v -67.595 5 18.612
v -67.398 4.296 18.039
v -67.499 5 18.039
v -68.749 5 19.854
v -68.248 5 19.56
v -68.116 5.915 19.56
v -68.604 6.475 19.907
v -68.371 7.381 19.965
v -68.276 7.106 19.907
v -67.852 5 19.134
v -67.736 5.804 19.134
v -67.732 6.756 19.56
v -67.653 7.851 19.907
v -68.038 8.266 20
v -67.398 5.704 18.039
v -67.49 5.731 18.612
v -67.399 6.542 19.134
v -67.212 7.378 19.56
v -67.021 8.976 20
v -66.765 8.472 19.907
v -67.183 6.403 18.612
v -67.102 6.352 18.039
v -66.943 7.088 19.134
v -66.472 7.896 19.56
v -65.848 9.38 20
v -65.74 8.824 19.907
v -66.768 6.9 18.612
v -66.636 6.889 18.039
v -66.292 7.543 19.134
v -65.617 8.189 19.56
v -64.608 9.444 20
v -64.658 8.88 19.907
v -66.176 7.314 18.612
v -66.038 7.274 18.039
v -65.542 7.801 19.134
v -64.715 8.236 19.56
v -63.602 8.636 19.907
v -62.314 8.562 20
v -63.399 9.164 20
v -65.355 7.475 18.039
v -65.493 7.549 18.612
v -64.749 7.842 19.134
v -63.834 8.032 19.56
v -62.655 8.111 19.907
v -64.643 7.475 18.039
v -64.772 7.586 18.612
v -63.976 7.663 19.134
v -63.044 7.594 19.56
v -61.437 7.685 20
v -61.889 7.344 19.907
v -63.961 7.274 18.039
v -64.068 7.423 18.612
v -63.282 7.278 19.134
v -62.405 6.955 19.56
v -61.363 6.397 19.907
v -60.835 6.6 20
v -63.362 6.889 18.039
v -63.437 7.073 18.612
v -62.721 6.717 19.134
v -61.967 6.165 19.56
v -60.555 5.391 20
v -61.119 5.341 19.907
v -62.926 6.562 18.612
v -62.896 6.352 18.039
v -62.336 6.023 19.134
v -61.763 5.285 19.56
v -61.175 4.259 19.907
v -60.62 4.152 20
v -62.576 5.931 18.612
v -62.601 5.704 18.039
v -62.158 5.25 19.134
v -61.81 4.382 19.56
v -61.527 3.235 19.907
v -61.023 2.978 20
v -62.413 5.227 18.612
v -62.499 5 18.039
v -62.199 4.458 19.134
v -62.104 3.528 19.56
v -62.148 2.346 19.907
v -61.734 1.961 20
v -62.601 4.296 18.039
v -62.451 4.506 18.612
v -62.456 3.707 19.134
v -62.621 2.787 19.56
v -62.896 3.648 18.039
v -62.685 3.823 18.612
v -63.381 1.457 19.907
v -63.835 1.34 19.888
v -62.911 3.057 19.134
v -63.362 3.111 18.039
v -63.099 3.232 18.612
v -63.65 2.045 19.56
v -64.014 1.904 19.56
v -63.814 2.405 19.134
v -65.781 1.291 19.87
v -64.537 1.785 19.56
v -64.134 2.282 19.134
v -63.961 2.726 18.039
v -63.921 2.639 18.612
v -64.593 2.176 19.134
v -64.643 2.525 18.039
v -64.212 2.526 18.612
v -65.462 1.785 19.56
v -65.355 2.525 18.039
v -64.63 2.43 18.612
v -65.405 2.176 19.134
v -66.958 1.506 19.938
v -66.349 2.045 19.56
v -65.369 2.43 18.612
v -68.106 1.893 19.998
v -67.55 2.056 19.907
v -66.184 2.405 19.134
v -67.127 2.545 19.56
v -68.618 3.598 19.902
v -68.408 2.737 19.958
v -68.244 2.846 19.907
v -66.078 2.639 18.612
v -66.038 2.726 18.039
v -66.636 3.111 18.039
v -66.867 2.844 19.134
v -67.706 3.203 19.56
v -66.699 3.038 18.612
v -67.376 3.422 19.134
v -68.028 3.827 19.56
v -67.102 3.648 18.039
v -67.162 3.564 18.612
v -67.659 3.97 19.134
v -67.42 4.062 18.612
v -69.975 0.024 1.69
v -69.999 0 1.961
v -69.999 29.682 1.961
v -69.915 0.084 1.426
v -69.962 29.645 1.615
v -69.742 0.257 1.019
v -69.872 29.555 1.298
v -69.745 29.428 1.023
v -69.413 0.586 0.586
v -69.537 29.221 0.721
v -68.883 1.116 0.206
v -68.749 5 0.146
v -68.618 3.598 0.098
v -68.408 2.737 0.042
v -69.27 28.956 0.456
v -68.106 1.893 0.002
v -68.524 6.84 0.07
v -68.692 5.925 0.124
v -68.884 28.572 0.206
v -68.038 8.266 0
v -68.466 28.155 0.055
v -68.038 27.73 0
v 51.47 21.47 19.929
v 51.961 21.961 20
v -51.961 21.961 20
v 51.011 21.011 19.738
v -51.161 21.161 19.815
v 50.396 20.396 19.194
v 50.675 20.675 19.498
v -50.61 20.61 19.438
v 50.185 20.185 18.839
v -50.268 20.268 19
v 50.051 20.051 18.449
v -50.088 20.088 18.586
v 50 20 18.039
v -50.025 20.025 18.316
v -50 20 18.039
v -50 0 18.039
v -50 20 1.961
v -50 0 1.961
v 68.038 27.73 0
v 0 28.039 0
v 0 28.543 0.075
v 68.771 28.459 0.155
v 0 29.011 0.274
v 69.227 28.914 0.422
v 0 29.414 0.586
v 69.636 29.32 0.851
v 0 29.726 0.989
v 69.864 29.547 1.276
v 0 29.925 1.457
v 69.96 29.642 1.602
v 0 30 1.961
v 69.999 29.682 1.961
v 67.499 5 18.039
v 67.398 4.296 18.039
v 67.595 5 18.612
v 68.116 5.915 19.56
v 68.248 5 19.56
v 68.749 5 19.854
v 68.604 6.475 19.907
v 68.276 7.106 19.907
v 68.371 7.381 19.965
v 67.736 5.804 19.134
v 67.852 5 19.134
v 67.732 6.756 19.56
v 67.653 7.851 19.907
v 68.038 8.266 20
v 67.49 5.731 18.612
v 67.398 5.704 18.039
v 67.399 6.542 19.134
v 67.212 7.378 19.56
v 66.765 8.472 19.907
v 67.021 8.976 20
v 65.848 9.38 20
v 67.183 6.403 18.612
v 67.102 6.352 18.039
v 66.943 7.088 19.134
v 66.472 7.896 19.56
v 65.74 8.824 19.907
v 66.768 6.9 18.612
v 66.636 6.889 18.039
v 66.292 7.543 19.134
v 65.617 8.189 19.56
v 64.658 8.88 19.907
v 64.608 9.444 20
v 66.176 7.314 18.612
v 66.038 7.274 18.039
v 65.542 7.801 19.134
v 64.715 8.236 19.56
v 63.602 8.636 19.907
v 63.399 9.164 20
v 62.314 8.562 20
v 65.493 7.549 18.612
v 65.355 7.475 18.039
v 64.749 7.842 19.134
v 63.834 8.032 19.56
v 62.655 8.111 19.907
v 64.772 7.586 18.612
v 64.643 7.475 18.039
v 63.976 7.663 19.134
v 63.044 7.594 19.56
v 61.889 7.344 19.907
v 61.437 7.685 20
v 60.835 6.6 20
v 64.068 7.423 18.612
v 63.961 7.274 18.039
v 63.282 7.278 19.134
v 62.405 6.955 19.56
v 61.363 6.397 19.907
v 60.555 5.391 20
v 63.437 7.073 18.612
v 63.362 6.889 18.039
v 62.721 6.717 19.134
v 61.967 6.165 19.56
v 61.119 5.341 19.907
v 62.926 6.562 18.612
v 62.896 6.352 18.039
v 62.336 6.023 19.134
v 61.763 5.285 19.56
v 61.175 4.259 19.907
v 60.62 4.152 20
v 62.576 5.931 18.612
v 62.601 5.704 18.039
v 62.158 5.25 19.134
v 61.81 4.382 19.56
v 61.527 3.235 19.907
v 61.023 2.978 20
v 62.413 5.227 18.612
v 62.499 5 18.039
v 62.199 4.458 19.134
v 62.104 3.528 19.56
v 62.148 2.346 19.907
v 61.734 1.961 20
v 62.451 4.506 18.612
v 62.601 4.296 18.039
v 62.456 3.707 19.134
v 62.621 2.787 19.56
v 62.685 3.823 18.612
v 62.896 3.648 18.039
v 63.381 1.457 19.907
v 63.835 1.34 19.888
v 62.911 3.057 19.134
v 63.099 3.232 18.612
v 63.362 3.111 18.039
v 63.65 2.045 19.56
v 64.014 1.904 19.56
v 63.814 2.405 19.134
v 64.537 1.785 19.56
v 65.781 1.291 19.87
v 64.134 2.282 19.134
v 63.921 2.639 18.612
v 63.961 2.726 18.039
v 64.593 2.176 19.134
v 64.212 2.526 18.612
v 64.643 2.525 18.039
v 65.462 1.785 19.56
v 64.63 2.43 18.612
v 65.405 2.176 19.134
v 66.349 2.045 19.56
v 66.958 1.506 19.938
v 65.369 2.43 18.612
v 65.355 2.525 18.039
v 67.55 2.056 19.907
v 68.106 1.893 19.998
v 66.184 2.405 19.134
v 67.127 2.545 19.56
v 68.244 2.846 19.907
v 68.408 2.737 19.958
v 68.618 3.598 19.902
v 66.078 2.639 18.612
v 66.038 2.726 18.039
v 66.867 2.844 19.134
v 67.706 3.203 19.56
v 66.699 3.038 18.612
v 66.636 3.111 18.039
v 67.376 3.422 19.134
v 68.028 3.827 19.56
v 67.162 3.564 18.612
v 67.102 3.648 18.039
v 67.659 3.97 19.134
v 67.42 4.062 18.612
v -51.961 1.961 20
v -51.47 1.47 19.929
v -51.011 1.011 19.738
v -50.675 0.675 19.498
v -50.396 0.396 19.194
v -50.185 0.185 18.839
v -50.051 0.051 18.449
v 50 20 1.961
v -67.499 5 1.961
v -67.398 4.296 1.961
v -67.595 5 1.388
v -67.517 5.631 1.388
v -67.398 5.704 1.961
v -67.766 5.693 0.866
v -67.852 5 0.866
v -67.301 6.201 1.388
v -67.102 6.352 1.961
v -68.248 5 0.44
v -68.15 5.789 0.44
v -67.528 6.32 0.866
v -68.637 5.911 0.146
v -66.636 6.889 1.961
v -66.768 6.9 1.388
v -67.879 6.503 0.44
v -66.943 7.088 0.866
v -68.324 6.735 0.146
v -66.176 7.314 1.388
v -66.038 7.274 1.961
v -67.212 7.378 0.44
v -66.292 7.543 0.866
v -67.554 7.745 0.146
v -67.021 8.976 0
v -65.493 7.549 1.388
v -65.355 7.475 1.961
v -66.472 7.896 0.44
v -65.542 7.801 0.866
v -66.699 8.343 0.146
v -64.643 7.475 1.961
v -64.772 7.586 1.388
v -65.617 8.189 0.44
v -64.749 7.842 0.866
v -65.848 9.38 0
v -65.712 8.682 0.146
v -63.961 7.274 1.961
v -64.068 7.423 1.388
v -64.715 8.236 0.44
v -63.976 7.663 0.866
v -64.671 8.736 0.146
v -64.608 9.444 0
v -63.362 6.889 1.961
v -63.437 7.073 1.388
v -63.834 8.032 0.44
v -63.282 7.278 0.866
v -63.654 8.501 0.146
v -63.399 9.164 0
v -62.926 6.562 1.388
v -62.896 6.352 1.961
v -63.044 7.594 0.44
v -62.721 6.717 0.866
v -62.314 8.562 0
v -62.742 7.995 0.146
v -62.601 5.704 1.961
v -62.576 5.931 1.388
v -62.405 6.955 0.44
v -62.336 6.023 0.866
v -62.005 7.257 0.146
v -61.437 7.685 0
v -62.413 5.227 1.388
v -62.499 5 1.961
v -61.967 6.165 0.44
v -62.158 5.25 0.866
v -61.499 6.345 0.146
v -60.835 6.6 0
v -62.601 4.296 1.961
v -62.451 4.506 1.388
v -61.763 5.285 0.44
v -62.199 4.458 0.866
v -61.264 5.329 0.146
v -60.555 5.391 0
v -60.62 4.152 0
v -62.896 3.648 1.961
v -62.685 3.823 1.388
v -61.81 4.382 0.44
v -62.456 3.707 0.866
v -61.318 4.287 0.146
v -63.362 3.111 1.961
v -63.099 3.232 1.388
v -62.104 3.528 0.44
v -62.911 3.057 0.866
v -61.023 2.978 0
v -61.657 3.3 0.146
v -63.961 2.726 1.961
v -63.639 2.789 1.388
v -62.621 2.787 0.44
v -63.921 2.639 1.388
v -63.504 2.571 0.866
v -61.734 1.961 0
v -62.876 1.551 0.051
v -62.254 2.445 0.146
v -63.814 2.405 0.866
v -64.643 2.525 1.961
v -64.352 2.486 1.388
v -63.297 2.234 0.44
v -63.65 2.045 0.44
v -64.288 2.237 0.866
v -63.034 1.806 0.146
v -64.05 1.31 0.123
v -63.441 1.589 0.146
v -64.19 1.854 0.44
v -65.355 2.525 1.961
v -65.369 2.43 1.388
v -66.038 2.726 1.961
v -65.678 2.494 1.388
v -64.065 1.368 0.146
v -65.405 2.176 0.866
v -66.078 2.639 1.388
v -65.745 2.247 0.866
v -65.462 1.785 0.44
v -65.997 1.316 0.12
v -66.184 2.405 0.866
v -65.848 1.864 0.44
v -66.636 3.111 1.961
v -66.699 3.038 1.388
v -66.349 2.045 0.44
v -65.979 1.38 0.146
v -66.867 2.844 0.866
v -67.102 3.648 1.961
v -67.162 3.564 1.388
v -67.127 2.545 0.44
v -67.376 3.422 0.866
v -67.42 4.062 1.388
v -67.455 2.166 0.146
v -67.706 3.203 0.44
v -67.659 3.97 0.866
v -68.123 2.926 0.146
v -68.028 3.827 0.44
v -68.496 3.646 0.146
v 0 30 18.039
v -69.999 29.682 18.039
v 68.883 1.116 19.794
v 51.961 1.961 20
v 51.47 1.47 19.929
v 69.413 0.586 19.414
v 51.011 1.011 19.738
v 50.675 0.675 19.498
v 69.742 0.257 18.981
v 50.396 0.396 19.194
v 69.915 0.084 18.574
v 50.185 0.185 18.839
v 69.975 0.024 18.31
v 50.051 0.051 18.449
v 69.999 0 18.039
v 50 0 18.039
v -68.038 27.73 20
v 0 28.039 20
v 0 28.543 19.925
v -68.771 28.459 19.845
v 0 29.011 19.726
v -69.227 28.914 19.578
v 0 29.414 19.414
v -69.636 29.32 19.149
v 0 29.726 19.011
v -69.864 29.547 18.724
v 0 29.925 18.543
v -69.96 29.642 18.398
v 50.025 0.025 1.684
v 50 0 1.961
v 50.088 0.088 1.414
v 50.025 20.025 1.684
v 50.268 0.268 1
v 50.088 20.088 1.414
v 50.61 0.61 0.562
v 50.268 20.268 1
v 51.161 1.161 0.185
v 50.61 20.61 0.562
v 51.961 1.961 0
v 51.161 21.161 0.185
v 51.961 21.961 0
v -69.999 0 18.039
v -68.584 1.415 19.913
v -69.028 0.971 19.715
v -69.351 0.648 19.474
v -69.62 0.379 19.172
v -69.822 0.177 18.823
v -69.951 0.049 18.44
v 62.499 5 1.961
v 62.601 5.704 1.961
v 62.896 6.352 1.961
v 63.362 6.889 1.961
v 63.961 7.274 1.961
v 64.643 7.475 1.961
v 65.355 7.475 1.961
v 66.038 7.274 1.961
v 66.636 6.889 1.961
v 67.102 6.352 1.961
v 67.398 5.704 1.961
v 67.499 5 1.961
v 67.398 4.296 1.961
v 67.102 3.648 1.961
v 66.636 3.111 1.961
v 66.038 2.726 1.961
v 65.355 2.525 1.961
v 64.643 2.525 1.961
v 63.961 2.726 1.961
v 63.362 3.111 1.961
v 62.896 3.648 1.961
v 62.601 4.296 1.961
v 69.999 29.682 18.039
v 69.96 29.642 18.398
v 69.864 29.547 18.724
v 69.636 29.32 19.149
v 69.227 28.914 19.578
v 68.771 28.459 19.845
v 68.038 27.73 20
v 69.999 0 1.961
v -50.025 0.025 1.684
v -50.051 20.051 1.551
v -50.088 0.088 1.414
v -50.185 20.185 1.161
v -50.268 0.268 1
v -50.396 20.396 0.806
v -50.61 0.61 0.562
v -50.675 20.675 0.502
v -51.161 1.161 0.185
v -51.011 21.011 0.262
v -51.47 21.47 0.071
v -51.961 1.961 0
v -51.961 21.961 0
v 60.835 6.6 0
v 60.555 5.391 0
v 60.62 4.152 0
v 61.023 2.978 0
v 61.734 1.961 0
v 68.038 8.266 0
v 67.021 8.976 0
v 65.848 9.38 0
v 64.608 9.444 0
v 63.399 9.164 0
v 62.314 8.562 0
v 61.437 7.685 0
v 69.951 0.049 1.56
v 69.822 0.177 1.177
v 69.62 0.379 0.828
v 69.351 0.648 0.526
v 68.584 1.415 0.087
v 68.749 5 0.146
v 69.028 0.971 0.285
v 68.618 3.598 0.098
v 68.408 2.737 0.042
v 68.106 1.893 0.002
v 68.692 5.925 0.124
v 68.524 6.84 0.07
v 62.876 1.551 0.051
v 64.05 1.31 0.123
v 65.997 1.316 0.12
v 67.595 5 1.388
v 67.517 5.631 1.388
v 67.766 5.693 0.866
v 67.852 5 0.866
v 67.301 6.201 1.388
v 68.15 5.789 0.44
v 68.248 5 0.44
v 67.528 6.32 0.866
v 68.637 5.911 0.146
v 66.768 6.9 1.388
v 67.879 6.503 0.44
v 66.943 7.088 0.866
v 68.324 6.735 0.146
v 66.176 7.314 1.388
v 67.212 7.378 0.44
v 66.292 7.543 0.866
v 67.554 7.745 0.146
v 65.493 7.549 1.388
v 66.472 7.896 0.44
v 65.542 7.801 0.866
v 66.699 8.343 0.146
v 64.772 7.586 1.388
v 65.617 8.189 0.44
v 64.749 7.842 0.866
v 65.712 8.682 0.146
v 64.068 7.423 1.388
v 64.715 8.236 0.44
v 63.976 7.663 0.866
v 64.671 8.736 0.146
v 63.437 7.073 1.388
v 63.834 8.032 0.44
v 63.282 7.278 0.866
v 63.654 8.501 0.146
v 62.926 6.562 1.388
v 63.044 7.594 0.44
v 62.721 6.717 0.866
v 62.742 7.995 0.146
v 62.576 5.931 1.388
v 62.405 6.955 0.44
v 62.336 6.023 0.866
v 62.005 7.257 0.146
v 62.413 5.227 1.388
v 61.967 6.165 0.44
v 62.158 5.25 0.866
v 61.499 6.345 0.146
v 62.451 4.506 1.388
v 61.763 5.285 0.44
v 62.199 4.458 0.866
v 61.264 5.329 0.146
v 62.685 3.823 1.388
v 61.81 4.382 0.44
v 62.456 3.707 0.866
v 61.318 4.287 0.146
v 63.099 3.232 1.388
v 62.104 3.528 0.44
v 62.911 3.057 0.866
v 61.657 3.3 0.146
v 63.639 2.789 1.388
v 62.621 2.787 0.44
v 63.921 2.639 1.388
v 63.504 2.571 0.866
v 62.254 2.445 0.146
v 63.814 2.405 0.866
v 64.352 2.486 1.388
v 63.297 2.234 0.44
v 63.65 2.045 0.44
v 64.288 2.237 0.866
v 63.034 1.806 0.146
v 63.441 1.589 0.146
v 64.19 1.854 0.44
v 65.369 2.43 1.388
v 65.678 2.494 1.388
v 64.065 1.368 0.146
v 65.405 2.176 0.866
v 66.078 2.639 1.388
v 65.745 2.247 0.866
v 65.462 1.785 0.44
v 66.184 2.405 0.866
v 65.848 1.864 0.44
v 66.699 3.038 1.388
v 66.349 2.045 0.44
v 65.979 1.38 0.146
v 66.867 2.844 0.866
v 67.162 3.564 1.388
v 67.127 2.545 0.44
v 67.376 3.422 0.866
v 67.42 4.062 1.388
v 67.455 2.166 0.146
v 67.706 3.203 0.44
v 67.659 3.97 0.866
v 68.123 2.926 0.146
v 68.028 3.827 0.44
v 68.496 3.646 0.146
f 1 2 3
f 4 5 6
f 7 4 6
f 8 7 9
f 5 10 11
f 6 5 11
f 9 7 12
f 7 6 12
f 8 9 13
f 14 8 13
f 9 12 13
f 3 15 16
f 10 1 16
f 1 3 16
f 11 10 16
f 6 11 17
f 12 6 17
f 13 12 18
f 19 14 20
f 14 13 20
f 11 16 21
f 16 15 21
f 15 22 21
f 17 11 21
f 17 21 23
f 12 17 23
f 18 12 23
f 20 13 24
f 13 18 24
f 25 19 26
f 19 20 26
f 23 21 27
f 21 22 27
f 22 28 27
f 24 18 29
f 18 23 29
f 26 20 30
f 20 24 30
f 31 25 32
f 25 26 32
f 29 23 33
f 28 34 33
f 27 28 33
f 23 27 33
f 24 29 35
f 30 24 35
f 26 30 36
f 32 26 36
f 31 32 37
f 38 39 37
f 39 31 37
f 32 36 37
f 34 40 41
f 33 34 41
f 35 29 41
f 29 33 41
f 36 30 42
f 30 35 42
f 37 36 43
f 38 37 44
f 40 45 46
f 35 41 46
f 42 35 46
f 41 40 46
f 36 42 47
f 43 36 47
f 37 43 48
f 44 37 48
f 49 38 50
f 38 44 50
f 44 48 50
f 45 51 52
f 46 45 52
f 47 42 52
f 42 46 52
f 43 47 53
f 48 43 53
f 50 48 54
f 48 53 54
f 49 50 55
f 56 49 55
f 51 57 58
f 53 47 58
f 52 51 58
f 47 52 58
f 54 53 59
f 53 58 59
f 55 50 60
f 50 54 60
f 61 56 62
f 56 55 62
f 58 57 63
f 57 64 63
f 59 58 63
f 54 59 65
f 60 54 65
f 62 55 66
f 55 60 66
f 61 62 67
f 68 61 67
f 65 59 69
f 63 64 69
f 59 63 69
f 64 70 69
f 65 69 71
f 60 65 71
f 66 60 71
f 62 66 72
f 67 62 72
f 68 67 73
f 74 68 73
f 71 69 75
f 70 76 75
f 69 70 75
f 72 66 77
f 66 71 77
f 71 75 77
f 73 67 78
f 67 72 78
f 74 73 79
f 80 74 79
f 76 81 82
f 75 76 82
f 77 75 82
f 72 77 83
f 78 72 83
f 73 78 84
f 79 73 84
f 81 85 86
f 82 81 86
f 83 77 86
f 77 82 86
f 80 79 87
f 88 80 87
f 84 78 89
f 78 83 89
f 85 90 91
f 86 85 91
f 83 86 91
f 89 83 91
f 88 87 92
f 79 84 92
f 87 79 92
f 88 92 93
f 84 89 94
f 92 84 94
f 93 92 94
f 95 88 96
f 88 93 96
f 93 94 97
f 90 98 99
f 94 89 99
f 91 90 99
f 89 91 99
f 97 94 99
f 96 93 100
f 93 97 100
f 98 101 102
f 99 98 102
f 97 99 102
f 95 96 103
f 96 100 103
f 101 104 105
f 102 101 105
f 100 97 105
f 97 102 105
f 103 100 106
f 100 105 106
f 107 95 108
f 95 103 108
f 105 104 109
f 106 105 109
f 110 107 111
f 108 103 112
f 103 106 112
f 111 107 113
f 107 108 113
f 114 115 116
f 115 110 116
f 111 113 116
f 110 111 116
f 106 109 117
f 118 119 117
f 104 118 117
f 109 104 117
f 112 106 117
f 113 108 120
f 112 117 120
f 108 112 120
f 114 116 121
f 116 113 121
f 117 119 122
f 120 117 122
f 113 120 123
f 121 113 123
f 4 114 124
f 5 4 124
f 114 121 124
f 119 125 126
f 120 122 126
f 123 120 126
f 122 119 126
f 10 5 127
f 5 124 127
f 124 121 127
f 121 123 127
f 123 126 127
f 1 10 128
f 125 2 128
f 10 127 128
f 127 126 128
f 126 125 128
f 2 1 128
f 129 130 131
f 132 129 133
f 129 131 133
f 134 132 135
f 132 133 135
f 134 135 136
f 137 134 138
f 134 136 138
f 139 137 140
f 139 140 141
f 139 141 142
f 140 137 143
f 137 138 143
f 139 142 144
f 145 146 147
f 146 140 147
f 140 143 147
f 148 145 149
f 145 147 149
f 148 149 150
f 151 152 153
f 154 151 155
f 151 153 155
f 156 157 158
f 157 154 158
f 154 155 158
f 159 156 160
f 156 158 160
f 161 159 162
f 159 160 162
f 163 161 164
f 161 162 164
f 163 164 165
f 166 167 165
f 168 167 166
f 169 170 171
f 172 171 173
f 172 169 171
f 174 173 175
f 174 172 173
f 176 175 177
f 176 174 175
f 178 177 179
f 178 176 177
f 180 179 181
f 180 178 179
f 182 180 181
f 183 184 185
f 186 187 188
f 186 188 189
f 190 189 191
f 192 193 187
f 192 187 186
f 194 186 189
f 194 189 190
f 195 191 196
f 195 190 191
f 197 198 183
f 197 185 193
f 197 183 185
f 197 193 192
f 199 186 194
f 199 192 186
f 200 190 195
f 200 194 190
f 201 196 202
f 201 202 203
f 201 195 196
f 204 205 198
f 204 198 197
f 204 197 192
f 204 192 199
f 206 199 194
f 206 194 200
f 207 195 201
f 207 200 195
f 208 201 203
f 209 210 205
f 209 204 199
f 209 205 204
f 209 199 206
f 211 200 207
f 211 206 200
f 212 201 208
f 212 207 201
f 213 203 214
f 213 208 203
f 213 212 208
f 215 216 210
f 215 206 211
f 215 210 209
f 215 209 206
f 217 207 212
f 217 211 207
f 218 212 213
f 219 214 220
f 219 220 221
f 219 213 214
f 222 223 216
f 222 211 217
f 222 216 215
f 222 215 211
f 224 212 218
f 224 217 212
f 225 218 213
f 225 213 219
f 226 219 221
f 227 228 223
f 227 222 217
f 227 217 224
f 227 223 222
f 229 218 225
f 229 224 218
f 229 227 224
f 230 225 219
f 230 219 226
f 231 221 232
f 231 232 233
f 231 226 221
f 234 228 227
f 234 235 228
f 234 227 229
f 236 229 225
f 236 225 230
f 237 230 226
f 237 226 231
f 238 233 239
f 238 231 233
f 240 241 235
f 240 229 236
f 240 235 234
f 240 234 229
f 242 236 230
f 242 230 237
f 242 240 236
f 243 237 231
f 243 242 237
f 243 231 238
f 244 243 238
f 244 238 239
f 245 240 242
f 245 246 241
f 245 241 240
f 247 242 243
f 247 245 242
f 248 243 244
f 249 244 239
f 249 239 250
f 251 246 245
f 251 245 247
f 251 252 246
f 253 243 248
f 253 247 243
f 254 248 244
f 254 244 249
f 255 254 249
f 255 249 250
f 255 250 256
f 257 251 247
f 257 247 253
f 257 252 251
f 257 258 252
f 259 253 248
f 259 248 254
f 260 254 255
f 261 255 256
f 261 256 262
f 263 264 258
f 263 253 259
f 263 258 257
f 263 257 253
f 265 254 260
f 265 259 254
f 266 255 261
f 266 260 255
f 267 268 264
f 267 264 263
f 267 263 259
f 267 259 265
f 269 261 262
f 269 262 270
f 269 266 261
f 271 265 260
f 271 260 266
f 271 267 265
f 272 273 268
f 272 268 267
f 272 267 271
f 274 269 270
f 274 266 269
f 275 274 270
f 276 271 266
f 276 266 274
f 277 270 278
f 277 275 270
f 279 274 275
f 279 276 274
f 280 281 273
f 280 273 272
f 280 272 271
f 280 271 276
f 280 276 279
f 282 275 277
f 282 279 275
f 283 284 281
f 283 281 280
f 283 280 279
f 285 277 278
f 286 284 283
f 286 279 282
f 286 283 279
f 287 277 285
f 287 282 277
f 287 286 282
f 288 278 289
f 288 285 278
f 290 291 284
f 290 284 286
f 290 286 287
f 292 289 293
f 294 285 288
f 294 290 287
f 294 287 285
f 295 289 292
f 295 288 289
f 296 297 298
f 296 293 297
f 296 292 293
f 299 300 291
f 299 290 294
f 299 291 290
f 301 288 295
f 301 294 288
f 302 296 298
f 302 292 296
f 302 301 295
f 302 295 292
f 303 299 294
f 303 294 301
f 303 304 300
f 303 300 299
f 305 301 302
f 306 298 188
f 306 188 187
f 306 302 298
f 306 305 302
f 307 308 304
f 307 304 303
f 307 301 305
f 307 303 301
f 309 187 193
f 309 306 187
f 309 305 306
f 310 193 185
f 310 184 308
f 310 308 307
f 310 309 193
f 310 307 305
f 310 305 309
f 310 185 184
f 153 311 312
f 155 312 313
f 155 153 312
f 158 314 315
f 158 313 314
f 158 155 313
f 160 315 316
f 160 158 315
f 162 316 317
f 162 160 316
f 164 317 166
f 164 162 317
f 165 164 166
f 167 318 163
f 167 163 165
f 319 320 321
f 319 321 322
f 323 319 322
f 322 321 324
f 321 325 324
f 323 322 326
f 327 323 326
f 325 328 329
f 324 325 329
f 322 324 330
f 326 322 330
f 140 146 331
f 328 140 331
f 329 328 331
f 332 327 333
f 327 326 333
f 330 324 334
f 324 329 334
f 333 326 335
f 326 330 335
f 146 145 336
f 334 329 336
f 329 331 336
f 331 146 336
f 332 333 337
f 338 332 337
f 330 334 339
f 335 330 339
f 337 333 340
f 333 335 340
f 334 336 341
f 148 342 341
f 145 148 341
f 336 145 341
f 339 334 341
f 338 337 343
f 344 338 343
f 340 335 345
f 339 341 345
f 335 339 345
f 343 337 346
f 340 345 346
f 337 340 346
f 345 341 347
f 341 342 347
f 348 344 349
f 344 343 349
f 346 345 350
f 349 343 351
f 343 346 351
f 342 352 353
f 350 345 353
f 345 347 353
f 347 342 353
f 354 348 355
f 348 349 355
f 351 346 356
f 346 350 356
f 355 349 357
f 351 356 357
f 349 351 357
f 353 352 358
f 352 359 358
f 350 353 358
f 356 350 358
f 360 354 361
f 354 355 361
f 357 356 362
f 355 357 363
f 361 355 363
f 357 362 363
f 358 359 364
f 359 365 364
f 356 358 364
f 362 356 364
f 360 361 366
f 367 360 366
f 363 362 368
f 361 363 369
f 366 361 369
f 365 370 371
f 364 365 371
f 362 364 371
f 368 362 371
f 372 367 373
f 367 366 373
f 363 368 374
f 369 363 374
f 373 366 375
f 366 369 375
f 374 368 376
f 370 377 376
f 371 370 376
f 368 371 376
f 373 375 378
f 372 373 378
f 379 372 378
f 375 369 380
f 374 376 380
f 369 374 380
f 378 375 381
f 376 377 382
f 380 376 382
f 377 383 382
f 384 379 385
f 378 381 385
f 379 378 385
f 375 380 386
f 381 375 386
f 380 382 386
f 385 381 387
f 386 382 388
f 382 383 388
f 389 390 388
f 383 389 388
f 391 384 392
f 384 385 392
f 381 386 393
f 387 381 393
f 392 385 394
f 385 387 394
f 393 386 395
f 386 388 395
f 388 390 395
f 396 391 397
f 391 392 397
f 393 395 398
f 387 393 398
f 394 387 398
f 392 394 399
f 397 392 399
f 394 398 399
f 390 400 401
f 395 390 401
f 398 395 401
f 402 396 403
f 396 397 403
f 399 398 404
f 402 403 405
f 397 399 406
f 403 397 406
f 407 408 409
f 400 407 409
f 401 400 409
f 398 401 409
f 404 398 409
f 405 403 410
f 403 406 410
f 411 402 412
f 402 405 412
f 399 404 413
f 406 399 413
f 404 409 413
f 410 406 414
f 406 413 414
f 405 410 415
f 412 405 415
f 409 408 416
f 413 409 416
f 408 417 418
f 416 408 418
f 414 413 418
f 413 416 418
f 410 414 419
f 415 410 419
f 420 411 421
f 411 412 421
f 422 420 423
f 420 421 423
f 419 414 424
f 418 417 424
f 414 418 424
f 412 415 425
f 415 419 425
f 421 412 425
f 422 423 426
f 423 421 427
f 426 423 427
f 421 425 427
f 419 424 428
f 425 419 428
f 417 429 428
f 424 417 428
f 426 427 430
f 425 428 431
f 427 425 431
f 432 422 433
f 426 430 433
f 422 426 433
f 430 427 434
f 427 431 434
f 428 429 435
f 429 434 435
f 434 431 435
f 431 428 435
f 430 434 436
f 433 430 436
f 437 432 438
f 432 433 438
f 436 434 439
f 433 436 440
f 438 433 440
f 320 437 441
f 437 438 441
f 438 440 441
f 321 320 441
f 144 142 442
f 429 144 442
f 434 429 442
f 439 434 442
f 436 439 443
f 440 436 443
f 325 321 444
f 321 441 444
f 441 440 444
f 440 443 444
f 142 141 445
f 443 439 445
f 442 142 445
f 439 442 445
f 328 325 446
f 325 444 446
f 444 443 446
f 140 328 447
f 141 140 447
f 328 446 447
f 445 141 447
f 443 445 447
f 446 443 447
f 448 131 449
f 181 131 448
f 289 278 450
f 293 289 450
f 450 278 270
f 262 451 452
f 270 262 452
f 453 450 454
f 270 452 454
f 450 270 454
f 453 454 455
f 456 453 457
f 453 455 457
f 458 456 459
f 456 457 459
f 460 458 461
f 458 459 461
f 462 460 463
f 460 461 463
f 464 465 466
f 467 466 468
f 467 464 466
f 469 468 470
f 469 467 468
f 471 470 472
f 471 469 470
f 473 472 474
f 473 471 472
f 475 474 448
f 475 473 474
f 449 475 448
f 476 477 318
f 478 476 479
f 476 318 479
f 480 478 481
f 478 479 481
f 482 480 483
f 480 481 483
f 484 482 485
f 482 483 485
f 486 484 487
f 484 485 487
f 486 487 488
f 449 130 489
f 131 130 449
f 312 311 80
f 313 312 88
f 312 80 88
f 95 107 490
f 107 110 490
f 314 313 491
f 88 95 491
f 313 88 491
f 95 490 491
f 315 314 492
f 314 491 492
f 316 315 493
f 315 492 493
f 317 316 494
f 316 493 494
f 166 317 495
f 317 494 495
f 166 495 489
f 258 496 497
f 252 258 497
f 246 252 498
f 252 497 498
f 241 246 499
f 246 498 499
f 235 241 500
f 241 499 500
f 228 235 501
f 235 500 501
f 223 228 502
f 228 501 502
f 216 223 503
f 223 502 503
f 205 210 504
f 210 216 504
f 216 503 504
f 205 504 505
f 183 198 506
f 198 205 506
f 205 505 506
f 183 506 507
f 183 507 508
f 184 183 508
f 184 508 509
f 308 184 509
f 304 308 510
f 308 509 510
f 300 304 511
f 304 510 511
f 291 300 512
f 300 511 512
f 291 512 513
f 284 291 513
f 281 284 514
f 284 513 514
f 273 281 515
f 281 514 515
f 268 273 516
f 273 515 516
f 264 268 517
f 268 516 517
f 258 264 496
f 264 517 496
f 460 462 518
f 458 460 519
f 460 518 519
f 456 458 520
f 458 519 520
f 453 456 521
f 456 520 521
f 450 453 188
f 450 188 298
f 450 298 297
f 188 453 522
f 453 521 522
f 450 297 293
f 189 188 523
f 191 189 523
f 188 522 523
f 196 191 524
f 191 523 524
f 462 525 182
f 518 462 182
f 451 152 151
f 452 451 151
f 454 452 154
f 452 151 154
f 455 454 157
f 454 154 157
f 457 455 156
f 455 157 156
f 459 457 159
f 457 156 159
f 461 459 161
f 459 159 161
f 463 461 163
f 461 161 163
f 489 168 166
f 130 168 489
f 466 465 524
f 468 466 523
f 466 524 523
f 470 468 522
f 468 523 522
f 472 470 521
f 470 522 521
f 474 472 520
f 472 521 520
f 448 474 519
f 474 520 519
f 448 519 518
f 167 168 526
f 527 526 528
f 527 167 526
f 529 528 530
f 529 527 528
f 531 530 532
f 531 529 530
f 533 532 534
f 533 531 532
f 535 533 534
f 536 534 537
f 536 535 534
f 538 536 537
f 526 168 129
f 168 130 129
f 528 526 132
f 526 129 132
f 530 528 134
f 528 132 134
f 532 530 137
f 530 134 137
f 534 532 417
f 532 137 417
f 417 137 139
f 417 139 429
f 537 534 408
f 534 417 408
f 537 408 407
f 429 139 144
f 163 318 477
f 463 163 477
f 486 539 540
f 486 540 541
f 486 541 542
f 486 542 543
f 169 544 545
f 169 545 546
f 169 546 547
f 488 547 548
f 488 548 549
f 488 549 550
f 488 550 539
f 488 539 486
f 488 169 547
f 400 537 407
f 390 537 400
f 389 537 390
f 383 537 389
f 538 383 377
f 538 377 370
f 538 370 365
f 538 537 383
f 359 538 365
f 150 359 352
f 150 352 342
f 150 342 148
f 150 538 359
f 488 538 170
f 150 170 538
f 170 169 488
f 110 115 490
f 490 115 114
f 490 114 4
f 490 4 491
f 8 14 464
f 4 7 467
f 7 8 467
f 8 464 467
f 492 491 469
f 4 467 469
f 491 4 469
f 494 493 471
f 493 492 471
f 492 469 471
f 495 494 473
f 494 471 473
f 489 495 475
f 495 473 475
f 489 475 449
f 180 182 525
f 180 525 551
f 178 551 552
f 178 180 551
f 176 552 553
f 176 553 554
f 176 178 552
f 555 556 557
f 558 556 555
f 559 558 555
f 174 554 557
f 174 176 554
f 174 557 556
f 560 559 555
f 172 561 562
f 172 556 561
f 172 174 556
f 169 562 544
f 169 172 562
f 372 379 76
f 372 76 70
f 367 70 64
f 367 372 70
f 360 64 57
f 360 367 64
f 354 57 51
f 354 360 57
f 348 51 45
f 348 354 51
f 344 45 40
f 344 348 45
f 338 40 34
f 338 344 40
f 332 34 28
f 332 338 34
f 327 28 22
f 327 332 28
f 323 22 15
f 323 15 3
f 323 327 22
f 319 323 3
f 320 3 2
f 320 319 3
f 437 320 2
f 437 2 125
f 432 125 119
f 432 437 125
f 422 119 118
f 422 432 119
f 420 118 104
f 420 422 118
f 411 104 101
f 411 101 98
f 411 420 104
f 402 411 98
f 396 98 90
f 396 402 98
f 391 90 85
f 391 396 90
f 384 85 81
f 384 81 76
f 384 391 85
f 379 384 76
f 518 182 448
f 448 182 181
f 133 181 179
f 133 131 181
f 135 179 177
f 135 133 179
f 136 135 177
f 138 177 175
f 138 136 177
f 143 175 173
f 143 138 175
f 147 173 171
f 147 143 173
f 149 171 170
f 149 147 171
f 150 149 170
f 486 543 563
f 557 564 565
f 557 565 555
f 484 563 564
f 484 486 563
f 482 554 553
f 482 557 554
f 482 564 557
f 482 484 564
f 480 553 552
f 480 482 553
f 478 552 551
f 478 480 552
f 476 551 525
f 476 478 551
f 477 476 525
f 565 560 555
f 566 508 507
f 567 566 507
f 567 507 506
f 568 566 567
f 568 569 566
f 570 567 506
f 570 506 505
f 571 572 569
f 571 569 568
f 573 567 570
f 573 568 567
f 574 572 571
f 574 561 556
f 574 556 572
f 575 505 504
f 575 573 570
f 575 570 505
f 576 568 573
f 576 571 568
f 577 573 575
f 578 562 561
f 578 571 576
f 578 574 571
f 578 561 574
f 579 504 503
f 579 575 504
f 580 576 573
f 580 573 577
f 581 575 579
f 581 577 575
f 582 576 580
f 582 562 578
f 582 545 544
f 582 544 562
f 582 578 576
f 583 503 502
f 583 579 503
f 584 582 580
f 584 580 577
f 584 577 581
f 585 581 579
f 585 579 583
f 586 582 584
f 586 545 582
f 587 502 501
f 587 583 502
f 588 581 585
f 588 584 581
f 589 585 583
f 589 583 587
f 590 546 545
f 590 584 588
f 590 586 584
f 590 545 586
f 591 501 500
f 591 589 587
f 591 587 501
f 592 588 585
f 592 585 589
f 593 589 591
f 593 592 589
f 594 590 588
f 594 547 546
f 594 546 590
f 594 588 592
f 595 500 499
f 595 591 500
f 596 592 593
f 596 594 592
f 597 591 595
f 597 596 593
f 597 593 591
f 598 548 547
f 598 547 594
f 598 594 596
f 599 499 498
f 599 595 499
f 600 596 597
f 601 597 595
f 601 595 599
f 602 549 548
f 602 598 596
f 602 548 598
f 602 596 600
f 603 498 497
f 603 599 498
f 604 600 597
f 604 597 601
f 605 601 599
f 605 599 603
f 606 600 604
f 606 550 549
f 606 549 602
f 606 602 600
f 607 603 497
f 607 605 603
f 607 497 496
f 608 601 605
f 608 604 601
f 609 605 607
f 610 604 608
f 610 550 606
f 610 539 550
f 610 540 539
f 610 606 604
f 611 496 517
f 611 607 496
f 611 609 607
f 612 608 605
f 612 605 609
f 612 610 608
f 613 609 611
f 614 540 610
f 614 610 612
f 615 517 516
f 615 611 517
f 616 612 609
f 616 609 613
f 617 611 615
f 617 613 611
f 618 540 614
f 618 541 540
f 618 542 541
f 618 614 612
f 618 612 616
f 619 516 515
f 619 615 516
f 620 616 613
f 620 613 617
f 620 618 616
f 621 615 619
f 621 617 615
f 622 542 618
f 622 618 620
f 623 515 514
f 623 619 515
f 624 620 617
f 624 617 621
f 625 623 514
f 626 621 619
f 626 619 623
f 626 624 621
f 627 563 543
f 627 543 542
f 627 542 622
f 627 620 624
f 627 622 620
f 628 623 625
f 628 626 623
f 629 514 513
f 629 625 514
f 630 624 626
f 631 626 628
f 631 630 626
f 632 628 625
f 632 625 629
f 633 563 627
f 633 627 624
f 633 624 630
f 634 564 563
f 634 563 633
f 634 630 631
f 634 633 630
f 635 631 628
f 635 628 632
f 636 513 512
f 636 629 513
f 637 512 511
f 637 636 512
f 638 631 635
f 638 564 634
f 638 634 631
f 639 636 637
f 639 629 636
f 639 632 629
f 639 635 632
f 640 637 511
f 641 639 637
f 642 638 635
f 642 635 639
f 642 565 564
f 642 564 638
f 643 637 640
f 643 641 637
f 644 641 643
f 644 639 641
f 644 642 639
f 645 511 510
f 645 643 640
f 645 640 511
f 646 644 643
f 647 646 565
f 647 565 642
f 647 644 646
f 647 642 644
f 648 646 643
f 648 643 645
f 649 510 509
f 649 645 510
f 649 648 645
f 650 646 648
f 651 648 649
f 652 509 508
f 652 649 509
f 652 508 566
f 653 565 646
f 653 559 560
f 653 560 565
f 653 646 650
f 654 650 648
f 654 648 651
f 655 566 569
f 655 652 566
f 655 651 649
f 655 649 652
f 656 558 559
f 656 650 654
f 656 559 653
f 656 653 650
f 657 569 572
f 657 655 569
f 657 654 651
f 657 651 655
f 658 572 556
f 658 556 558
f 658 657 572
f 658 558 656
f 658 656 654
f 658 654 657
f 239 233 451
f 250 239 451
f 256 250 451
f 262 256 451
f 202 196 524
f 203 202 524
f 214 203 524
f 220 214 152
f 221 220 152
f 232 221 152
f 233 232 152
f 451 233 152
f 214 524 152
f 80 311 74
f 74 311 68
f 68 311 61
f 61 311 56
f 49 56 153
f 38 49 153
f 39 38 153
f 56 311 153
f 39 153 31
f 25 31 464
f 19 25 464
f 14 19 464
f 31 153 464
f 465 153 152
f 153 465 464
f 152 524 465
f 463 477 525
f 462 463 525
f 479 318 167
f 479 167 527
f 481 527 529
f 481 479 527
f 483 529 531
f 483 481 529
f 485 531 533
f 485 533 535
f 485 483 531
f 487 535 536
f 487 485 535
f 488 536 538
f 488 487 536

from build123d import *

# Parameters (mm, degrees)
F1_DEPTH     = 20
F3_D         = 5
F5_T1_DEPTH  = 39.6866504653
F5_T3_DEPTH  = 75.0024143135
F5_T5_DEPTH  = 75.0024143135
F5_T7_DEPTH  = 30.0041054994
F5_T9_DEPTH  = 25.0024143135
F5_T11_DEPTH = 100
F5_T13_DEPTH = 30.0041054994
F5_T27_DEPTH = 30.004828627
F5_T31_DEPTH = 105.0024143135
F5_T38_DEPTH = 105.0024143135
F5_T42_DEPTH = 30.004828627
F5_T49_DEPTH = 105.0024143135
F5_T53_DEPTH = 30.004828627
F5_T60_DEPTH = 30.004828627
F5_T64_DEPTH = 105.0024143135


# Not quite as in the source:
# - a fillet or chamfer that OpenCascade refuses, or shapes differently, is made with other operations: its cross-section is extruded or revolved along the edge and cut away or added


with BuildPart() as f1:
    # F0 (on Top) → F1 (new body)
    with BuildSketch(Plane.XY):
        Polygon((69.9992768724, 29.6818218383), (0, 30), (0, 20), (50, 20), (50, 0), (69.9992768724, 0), align=None)
    extrude(amount=F1_DEPTH)

    # F3 (through all)
    with Locations(Plane.XY.offset(20)):
        with Locations((64.9992768724, 5)):
            Hole(F3_D / 2)

    # F4: F1 across face


with BuildPart() as f1_1:
    add(f1.part)
    add(f1.part.mirror(Plane(origin=(0, 25, 10), x_dir=(0, -1, 0), z_dir=(-1, 0, 0))))

    # F5: fillet of radius 2 on 22 edges, made by hand

    # F5_s2 → F5_t1 (cut)
    with BuildSketch(Plane.XZ.offset(-34.6842361518)):
        with BuildLine():
            ThreePointArc((69.9996768724, 17.9990343146), (69.4134904348, 19.4142135624), (67.998311187, 20.0004))
            Line((67.998311187, 20.0004), (67.998311187, 20.2005365685))
            ThreePointArc((67.998311187, 20.2005365685), (68.9987940297, 20.2001365685), (69.9992768724, 20.2001365685))
            Line((69.9992768724, 20.2001365685), (70.1994134409, 20))
            ThreePointArc((70.1994134409, 20), (70.1994134409, 18.9995171573), (70.1998134409, 17.9990343146))
            Line((70.1998134409, 17.9990343146), (69.9996768724, 17.9990343146))
        make_face()
        with BuildLine():
            ThreePointArc((-67.998311187, 20.0004), (-69.4134904348, 19.4142135624), (-69.9996768724, 17.9990343146))
            Line((-69.9996768724, 17.9990343146), (-70.1998134409, 17.9990343146))
            ThreePointArc((-70.1998134409, 17.9990343146), (-70.1994134409, 18.9995171573), (-70.1994134409, 20))
            Line((-70.1994134409, 20), (-69.9992768724, 20.2001365685))
            ThreePointArc((-69.9992768724, 20.2001365685), (-68.9987940297, 20.2001365685), (-67.998311187, 20.2005365685))
            Line((-67.998311187, 20.2005365685), (-67.998311187, 20.0004))
        make_face()
        with BuildLine():
            ThreePointArc((69.9996768724, 2.0009656854), (69.4134904348, 0.5857864376), (67.998311187, -0.0004))
            Line((67.998311187, -0.0004), (67.998311187, -0.2005365685))
            ThreePointArc((67.998311187, -0.2005365685), (68.9987940297, -0.2001365685), (69.9992768724, -0.2001365685))
            Line((69.9992768724, -0.2001365685), (70.1994134409, 0))
            ThreePointArc((70.1994134409, 0), (70.1994134409, 1.0004828427), (70.1998134409, 2.0009656854))
            Line((70.1998134409, 2.0009656854), (69.9996768724, 2.0009656854))
        make_face()
        with BuildLine():
            ThreePointArc((-69.9996768724, 2.0009656854), (-69.4134904348, 0.5857864376), (-67.998311187, -0.0004))
            Line((-67.998311187, -0.0004), (-67.998311187, -0.2005365685))
            ThreePointArc((-67.998311187, -0.2005365685), (-68.9987940297, -0.2001365685), (-69.9992768724, -0.2001365685))
            Line((-69.9992768724, -0.2001365685), (-70.1994134409, 0))
            ThreePointArc((-70.1994134409, 0), (-70.1994134409, 1.0004828427), (-70.1998134409, 2.0009656854))
            Line((-70.1998134409, 2.0009656854), (-69.9996768724, 2.0009656854))
        make_face()
    extrude(amount=F5_T1_DEPTH, mode=Mode.SUBTRACT)

    # F5_s4 → F5_t3 (cut)
    with BuildSketch(Plane(origin=(74.8652788484, -0.3402963268, 0), x_dir=(0, 0, 1), z_dir=(-0.9999896696, 0.0045454023, 0))):
        with BuildLine():
            ThreePointArc((20.0004, 27.9987244027), (19.4142135624, 29.4139036505), (17.9990343146, 30.0000900882))
            Line((17.9990343146, 30.0000900882), (17.9990343146, 30.2002266567))
            ThreePointArc((17.9990343146, 30.2002266567), (18.9995171573, 30.1998266567), (20, 30.1998266567))
            Line((20, 30.1998266567), (20.2001365685, 29.9996900882))
            ThreePointArc((20.2001365685, 29.9996900882), (20.2001365685, 28.9992072455), (20.2005365685, 27.9987244027))
            Line((20.2005365685, 27.9987244027), (20.0004, 27.9987244027))
        make_face()
        with BuildLine():
            ThreePointArc((-0.0004, 27.9987244027), (0.5857864376, 29.4139036505), (2.0009656854, 30.0000900882))
            Line((2.0009656854, 30.0000900882), (2.0009656854, 30.2002266567))
            ThreePointArc((2.0009656854, 30.2002266567), (1.0004828427, 30.1998266567), (0, 30.1998266567))
            Line((0, 30.1998266567), (-0.2001365685, 29.9996900882))
            ThreePointArc((-0.2001365685, 29.9996900882), (-0.2001365685, 28.9992072455), (-0.2005365685, 27.9987244027))
            Line((-0.2005365685, 27.9987244027), (-0.0004, 27.9987244027))
        make_face()
    extrude(amount=F5_T3_DEPTH, mode=Mode.SUBTRACT)

    # F5_s6 → F5_t5 (cut)
    with BuildSketch(Plane(origin=(-74.8652788484, -0.3402963268, 0), x_dir=(0, 0, 1), z_dir=(0.9999896696, 0.0045454023, 0))):
        with BuildLine():
            ThreePointArc((20.0004, -27.9987244027), (19.4142135624, -29.4139036505), (17.9990343146, -30.0000900882))
            Line((17.9990343146, -30.0000900882), (17.9990343146, -30.2002266567))
            ThreePointArc((17.9990343146, -30.2002266567), (18.9995171573, -30.1998266567), (20, -30.1998266567))
            Line((20, -30.1998266567), (20.2001365685, -29.9996900882))
            ThreePointArc((20.2001365685, -29.9996900882), (20.2001365685, -28.9992072455), (20.2005365685, -27.9987244027))
            Line((20.2005365685, -27.9987244027), (20.0004, -27.9987244027))
        make_face()
        with BuildLine():
            ThreePointArc((2.0009656854, -30.0000900882), (0.5857864376, -29.4139036505), (-0.0004, -27.9987244027))
            Line((-0.0004, -27.9987244027), (-0.2005365685, -27.9987244027))
            ThreePointArc((-0.2005365685, -27.9987244027), (-0.2001365685, -28.9992072455), (-0.2001365685, -29.9996900882))
            Line((-0.2001365685, -29.9996900882), (0, -30.1998266567))
            ThreePointArc((0, -30.1998266567), (1.0004828427, -30.1998266567), (2.0009656854, -30.2002266567))
            Line((2.0009656854, -30.2002266567), (2.0009656854, -30.0000900882))
        make_face()
    extrude(amount=F5_T5_DEPTH, mode=Mode.SUBTRACT)

    # F5_s8 → F5_t7 (cut)
    with BuildSketch(Plane.YZ.offset(-75.0016911859)):
        with BuildLine():
            ThreePointArc((2.0009656854, 20.0004), (0.5857864376, 19.4142135624), (-0.0004, 17.9990343146))
            Line((-0.0004, 17.9990343146), (-0.2005365685, 17.9990343146))
            ThreePointArc((-0.2005365685, 17.9990343146), (-0.2001365685, 18.9995171573), (-0.2001365685, 20))
            Line((-0.2001365685, 20), (0, 20.2001365685))
            ThreePointArc((0, 20.2001365685), (1.0004828427, 20.2001365685), (2.0009656854, 20.2005365685))
            Line((2.0009656854, 20.2005365685), (2.0009656854, 20.0004))
        make_face()
        with BuildLine():
            ThreePointArc((-0.0004, 2.0009656854), (0.5857864376, 0.5857864376), (2.0009656854, -0.0004))
            Line((2.0009656854, -0.0004), (2.0009656854, -0.2005365685))
            ThreePointArc((2.0009656854, -0.2005365685), (1.0004828427, -0.2001365685), (0, -0.2001365685))
            Line((0, -0.2001365685), (-0.2001365685, 0))
            ThreePointArc((-0.2001365685, 0), (-0.2001365685, 1.0004828427), (-0.2005365685, 2.0009656854))
            Line((-0.2005365685, 2.0009656854), (-0.0004, 2.0009656854))
        make_face()
    extrude(amount=F5_T7_DEPTH, mode=Mode.SUBTRACT)

    # F5_s10 → F5_t9 (cut)
    with BuildSketch(Plane.XZ.offset(-20)):
        with BuildLine():
            ThreePointArc((-52.0009656854, 20.0004), (-50.5857864376, 19.4142135624), (-49.9996, 17.9990343146))
            Line((-49.9996, 17.9990343146), (-49.7994634315, 17.9990343146))
            ThreePointArc((-49.7994634315, 17.9990343146), (-49.7998634315, 18.9995171573), (-49.7998634315, 20))
            Line((-49.7998634315, 20), (-50, 20.2001365685))
            ThreePointArc((-50, 20.2001365685), (-51.0004828427, 20.2001365685), (-52.0009656854, 20.2005365685))
            Line((-52.0009656854, 20.2005365685), (-52.0009656854, 20.0004))
        make_face()
        with BuildLine():
            ThreePointArc((52.0009656854, 20.0004), (50.5857864376, 19.4142135624), (49.9996, 17.9990343146))
            Line((49.9996, 17.9990343146), (49.7994634315, 17.9990343146))
            ThreePointArc((49.7994634315, 17.9990343146), (49.7998634315, 18.9995171573), (49.7998634315, 20))
            Line((49.7998634315, 20), (50, 20.2001365685))
            ThreePointArc((50, 20.2001365685), (51.0004828427, 20.2001365685), (52.0009656854, 20.2005365685))
            Line((52.0009656854, 20.2005365685), (52.0009656854, 20.0004))
        make_face()
        with BuildLine():
            ThreePointArc((-49.9996, 2.0009656854), (-50.5857864376, 0.5857864376), (-52.0009656854, -0.0004))
            Line((-52.0009656854, -0.0004), (-52.0009656854, -0.2005365685))
            ThreePointArc((-52.0009656854, -0.2005365685), (-51.0004828427, -0.2001365685), (-50, -0.2001365685))
            Line((-50, -0.2001365685), (-49.7998634315, 0))
            ThreePointArc((-49.7998634315, 0), (-49.7998634315, 1.0004828427), (-49.7994634315, 2.0009656854))
            Line((-49.7994634315, 2.0009656854), (-49.9996, 2.0009656854))
        make_face()
        with BuildLine():
            ThreePointArc((49.9996, 2.0009656854), (50.5857864376, 0.5857864376), (52.0009656854, -0.0004))
            Line((52.0009656854, -0.0004), (52.0009656854, -0.2005365685))
            ThreePointArc((52.0009656854, -0.2005365685), (51.0004828427, -0.2001365685), (50, -0.2001365685))
            Line((50, -0.2001365685), (49.7998634315, 0))
            ThreePointArc((49.7998634315, 0), (49.7998634315, 1.0004828427), (49.7994634315, 2.0009656854))
            Line((49.7994634315, 2.0009656854), (49.9996, 2.0009656854))
        make_face()
    extrude(amount=F5_T9_DEPTH, mode=Mode.SUBTRACT)

    # F5_s12 → F5_t11 (cut)
    with BuildSketch(Plane.YZ.offset(-50)):
        with BuildLine():
            ThreePointArc((22.0009656854, 20.0004), (20.5857864376, 19.4142135624), (19.9996, 17.9990343146))
            Line((19.9996, 17.9990343146), (19.7994634315, 17.9990343146))
            ThreePointArc((19.7994634315, 17.9990343146), (19.7998634315, 18.9995171573), (19.7998634315, 20))
            Line((19.7998634315, 20), (20, 20.2001365685))
            ThreePointArc((20, 20.2001365685), (21.0004828427, 20.2001365685), (22.0009656854, 20.2005365685))
            Line((22.0009656854, 20.2005365685), (22.0009656854, 20.0004))
        make_face()
        with BuildLine():
            ThreePointArc((19.9996, 2.0009656854), (20.5857864376, 0.5857864376), (22.0009656854, -0.0004))
            Line((22.0009656854, -0.0004), (22.0009656854, -0.2005365685))
            ThreePointArc((22.0009656854, -0.2005365685), (21.0004828427, -0.2001365685), (20, -0.2001365685))
            Line((20, -0.2001365685), (19.7998634315, 0))
            ThreePointArc((19.7998634315, 0), (19.7998634315, 1.0004828427), (19.7994634315, 2.0009656854))
            Line((19.7994634315, 2.0009656854), (19.9996, 2.0009656854))
        make_face()
    extrude(amount=F5_T11_DEPTH, mode=Mode.SUBTRACT)

    # F5_s14 → F5_t13 (cut)
    with BuildSketch(Plane.YZ.offset(44.9975856865)):
        with BuildLine():
            ThreePointArc((2.0009656854, 20.0004), (0.5857864376, 19.4142135624), (-0.0004, 17.9990343146))
            Line((-0.0004, 17.9990343146), (-0.2005365685, 17.9990343146))
            ThreePointArc((-0.2005365685, 17.9990343146), (-0.2001365685, 18.9995171573), (-0.2001365685, 20))
            Line((-0.2001365685, 20), (0, 20.2001365685))
            ThreePointArc((0, 20.2001365685), (1.0004828427, 20.2001365685), (2.0009656854, 20.2005365685))
            Line((2.0009656854, 20.2005365685), (2.0009656854, 20.0004))
        make_face()
        with BuildLine():
            ThreePointArc((2.0009656854, -0.0004), (0.5857864376, 0.5857864376), (-0.0004, 2.0009656854))
            Line((-0.0004, 2.0009656854), (-0.2005365685, 2.0009656854))
            ThreePointArc((-0.2005365685, 2.0009656854), (-0.2001365685, 1.0004828427), (-0.2001365685, 0))
            Line((-0.2001365685, 0), (0, -0.2001365685))
            ThreePointArc((0, -0.2001365685), (1.0004828427, -0.2001365685), (2.0009656854, -0.2005365685))
            Line((2.0009656854, -0.2005365685), (2.0009656854, -0.0004))
        make_face()
    extrude(amount=F5_T13_DEPTH, mode=Mode.SUBTRACT)

    # F5_s15 → F5_t16 (revolve, cut)
    with BuildSketch(Plane.XZ.offset(-5)):
        with BuildLine():
            ThreePointArc((69.5002425578, 20.0004), (68.08506331, 19.4142135624), (67.4988768724, 17.9990343146))
            Line((67.4988768724, 17.9990343146), (67.2987403038, 17.9990343146))
            ThreePointArc((67.2987403038, 17.9990343146), (67.2991403038, 18.9995171573), (67.2991403038, 20))
            Line((67.2991403038, 20), (67.4992768724, 20.2001365685))
            ThreePointArc((67.4992768724, 20.2001365685), (68.4997597151, 20.2001365685), (69.5002425578, 20.2005365685))
            Line((69.5002425578, 20.2005365685), (69.5002425578, 20.0004))
        make_face()
    revolve(axis=Axis((64.9992768724, 5, 20), (0, 0, 1)), mode=Mode.SUBTRACT)

    # F5_s17 → F5_t18 (revolve, cut)
    with BuildSketch(Plane.XZ.offset(-5)):
        with BuildLine():
            ThreePointArc((-69.5002425578, 20.0004), (-68.08506331, 19.4142135624), (-67.4988768724, 17.9990343146))
            Line((-67.4988768724, 17.9990343146), (-67.2987403038, 17.9990343146))
            ThreePointArc((-67.2987403038, 17.9990343146), (-67.2991403038, 18.9995171573), (-67.2991403038, 20))
            Line((-67.2991403038, 20), (-67.4992768724, 20.2001365685))
            ThreePointArc((-67.4992768724, 20.2001365685), (-68.4997597151, 20.2001365685), (-69.5002425578, 20.2005365685))
            Line((-69.5002425578, 20.2005365685), (-69.5002425578, 20.0004))
        make_face()
    revolve(axis=Axis((-64.9992768724, 5, 20), (0, 0, -1)), mode=Mode.SUBTRACT)

    # F5_s19 → F5_t20 (revolve, cut)
    with BuildSketch(Plane.XZ.offset(-5)):
        with BuildLine():
            ThreePointArc((67.4988768724, 2.0009656854), (68.08506331, 0.5857864376), (69.5002425578, -0.0004))
            Line((69.5002425578, -0.0004), (69.5002425578, -0.2005365685))
            ThreePointArc((69.5002425578, -0.2005365685), (68.4997597151, -0.2001365685), (67.4992768724, -0.2001365685))
            Line((67.4992768724, -0.2001365685), (67.2991403038, 0))
            ThreePointArc((67.2991403038, 0), (67.2991403038, 1.0004828427), (67.2987403038, 2.0009656854))
            Line((67.2987403038, 2.0009656854), (67.4988768724, 2.0009656854))
        make_face()
    revolve(axis=Axis((64.9992768724, 5, 0), (0, 0, 1)), mode=Mode.SUBTRACT)

    # F5_s21 → F5_t22 (revolve, cut)
    with BuildSketch(Plane.XZ.offset(-5)):
        with BuildLine():
            ThreePointArc((-67.4988768724, 2.0009656854), (-68.08506331, 0.5857864376), (-69.5002425578, -0.0004))
            Line((-69.5002425578, -0.0004), (-69.5002425578, -0.2005365685))
            ThreePointArc((-69.5002425578, -0.2005365685), (-68.4997597151, -0.2001365685), (-67.4992768724, -0.2001365685))
            Line((-67.4992768724, -0.2001365685), (-67.2991403038, 0))
            ThreePointArc((-67.2991403038, 0), (-67.2991403038, 1.0004828427), (-67.2987403038, 2.0009656854))
            Line((-67.2987403038, 2.0009656854), (-67.4988768724, 2.0009656854))
        make_face()
    revolve(axis=Axis((-64.9992768724, 5, 0), (0, 0, -1)), mode=Mode.SUBTRACT)


with BuildPart() as f5_tool25:
    # F5_s26 → F5_t27 (new body)
    with BuildSketch(Plane.XZ.offset(-25.0024143135)):
        with BuildLine():
            ThreePointArc((-52.0009656854, 20.0004), (-50.5857864376, 19.4142135624), (-49.9996, 17.9990343146))
            Line((-49.9996, 17.9990343146), (-49.7994634315, 17.9990343146))
            ThreePointArc((-49.7994634315, 17.9990343146), (-49.7998634315, 18.9995171573), (-49.7998634315, 20))
            Line((-49.7998634315, 20), (-50, 20.2001365685))
            ThreePointArc((-50, 20.2001365685), (-51.0004828427, 20.2001365685), (-52.0009656854, 20.2005365685))
            Line((-52.0009656854, 20.2005365685), (-52.0009656854, 20.0004))
        make_face()
    extrude(amount=F5_T27_DEPTH)

    split(bisect_by=Plane.XZ.offset(-20), keep=Keep.BOTTOM)


with BuildPart() as f5_tool29:
    # F5_s30 → F5_t31 (new body)
    with BuildSketch(Plane.YZ.offset(-55.0024143135)):
        with BuildLine():
            ThreePointArc((22.0009656854, 20.0004), (20.5857864376, 19.4142135624), (19.9996, 17.9990343146))
            Line((19.9996, 17.9990343146), (19.7994634315, 17.9990343146))
            ThreePointArc((19.7994634315, 17.9990343146), (19.7998634315, 18.9995171573), (19.7998634315, 20))
            Line((19.7998634315, 20), (20, 20.2001365685))
            ThreePointArc((20, 20.2001365685), (21.0004828427, 20.2001365685), (22.0009656854, 20.2005365685))
            Line((22.0009656854, 20.2005365685), (22.0009656854, 20.0004))
        make_face()
    extrude(amount=F5_T31_DEPTH)

    split(bisect_by=Plane.YZ.offset(-50), keep=Keep.BOTTOM)


with BuildPart() as f5_tool25_1:
    add(f5_tool25.part)

    # F5_t33: intersect F5_tool29
    add(f5_tool29.part, mode=Mode.INTERSECT)


with BuildPart() as f1_2:
    add(f1_1.part)

    # F5_t23: cut F5_tool25
    add(f5_tool25_1.part, mode=Mode.SUBTRACT)


with BuildPart() as f5_tool36:
    # F5_s37 → F5_t38 (new body)
    with BuildSketch(Plane.YZ.offset(-50)):
        with BuildLine():
            ThreePointArc((22.0009656854, 20.0004), (20.5857864376, 19.4142135624), (19.9996, 17.9990343146))
            Line((19.9996, 17.9990343146), (19.7994634315, 17.9990343146))
            ThreePointArc((19.7994634315, 17.9990343146), (19.7998634315, 18.9995171573), (19.7998634315, 20))
            Line((19.7998634315, 20), (20, 20.2001365685))
            ThreePointArc((20, 20.2001365685), (21.0004828427, 20.2001365685), (22.0009656854, 20.2005365685))
            Line((22.0009656854, 20.2005365685), (22.0009656854, 20.0004))
        make_face()
    extrude(amount=F5_T38_DEPTH)

    split(bisect_by=Plane.YZ.offset(50), keep=Keep.TOP)


with BuildPart() as f5_tool40:
    # F5_s41 → F5_t42 (new body)
    with BuildSketch(Plane.XZ.offset(-25.0024143135)):
        with BuildLine():
            ThreePointArc((52.0009656854, 20.0004), (50.5857864376, 19.4142135624), (49.9996, 17.9990343146))
            Line((49.9996, 17.9990343146), (49.7994634315, 17.9990343146))
            ThreePointArc((49.7994634315, 17.9990343146), (49.7998634315, 18.9995171573), (49.7998634315, 20))
            Line((49.7998634315, 20), (50, 20.2001365685))
            ThreePointArc((50, 20.2001365685), (51.0004828427, 20.2001365685), (52.0009656854, 20.2005365685))
            Line((52.0009656854, 20.2005365685), (52.0009656854, 20.0004))
        make_face()
    extrude(amount=F5_T42_DEPTH)

    split(bisect_by=Plane.XZ.offset(-20), keep=Keep.BOTTOM)


with BuildPart() as f5_tool36_1:
    add(f5_tool36.part)

    # F5_t44: intersect F5_tool40
    add(f5_tool40.part, mode=Mode.INTERSECT)


with BuildPart() as f1_3:
    add(f1_2.part)

    # F5_t34: cut F5_tool36
    add(f5_tool36_1.part, mode=Mode.SUBTRACT)


with BuildPart() as f5_tool47:
    # F5_s48 → F5_t49 (new body)
    with BuildSketch(Plane.YZ.offset(50)):
        with BuildLine():
            ThreePointArc((19.9996, 2.0009656854), (20.5857864376, 0.5857864376), (22.0009656854, -0.0004))
            Line((22.0009656854, -0.0004), (22.0009656854, -0.2005365685))
            ThreePointArc((22.0009656854, -0.2005365685), (21.0004828427, -0.2001365685), (20, -0.2001365685))
            Line((20, -0.2001365685), (19.7998634315, 0))
            ThreePointArc((19.7998634315, 0), (19.7998634315, 1.0004828427), (19.7994634315, 2.0009656854))
            Line((19.7994634315, 2.0009656854), (19.9996, 2.0009656854))
        make_face()
    extrude(amount=-F5_T49_DEPTH)

    split(bisect_by=Plane.YZ.offset(-50), keep=Keep.BOTTOM)


with BuildPart() as f5_tool51:
    # F5_s52 → F5_t53 (new body)
    with BuildSketch(Plane.XZ.offset(-25.0024143135)):
        with BuildLine():
            ThreePointArc((-49.9996, 2.0009656854), (-50.5857864376, 0.5857864376), (-52.0009656854, -0.0004))
            Line((-52.0009656854, -0.0004), (-52.0009656854, -0.2005365685))
            ThreePointArc((-52.0009656854, -0.2005365685), (-51.0004828427, -0.2001365685), (-50, -0.2001365685))
            Line((-50, -0.2001365685), (-49.7998634315, 0))
            ThreePointArc((-49.7998634315, 0), (-49.7998634315, 1.0004828427), (-49.7994634315, 2.0009656854))
            Line((-49.7994634315, 2.0009656854), (-49.9996, 2.0009656854))
        make_face()
    extrude(amount=F5_T53_DEPTH)

    split(bisect_by=Plane.XZ.offset(-20), keep=Keep.BOTTOM)


with BuildPart() as f5_tool47_1:
    add(f5_tool47.part)

    # F5_t55: intersect F5_tool51
    add(f5_tool51.part, mode=Mode.INTERSECT)


with BuildPart() as f1_4:
    add(f1_3.part)

    # F5_t45: cut F5_tool47
    add(f5_tool47_1.part, mode=Mode.SUBTRACT)


with BuildPart() as f5_tool58:
    # F5_s59 → F5_t60 (new body)
    with BuildSketch(Plane.XZ.offset(-25.0024143135)):
        with BuildLine():
            ThreePointArc((49.9996, 2.0009656854), (50.5857864376, 0.5857864376), (52.0009656854, -0.0004))
            Line((52.0009656854, -0.0004), (52.0009656854, -0.2005365685))
            ThreePointArc((52.0009656854, -0.2005365685), (51.0004828427, -0.2001365685), (50, -0.2001365685))
            Line((50, -0.2001365685), (49.7998634315, 0))
            ThreePointArc((49.7998634315, 0), (49.7998634315, 1.0004828427), (49.7994634315, 2.0009656854))
            Line((49.7994634315, 2.0009656854), (49.9996, 2.0009656854))
        make_face()
    extrude(amount=F5_T60_DEPTH)

    split(bisect_by=Plane.XZ.offset(-20), keep=Keep.BOTTOM)


with BuildPart() as f5_tool62:
    # F5_s63 → F5_t64 (new body)
    with BuildSketch(Plane.YZ.offset(55.0024143135)):
        with BuildLine():
            ThreePointArc((19.9996, 2.0009656854), (20.5857864376, 0.5857864376), (22.0009656854, -0.0004))
            Line((22.0009656854, -0.0004), (22.0009656854, -0.2005365685))
            ThreePointArc((22.0009656854, -0.2005365685), (21.0004828427, -0.2001365685), (20, -0.2001365685))
            Line((20, -0.2001365685), (19.7998634315, 0))
            ThreePointArc((19.7998634315, 0), (19.7998634315, 1.0004828427), (19.7994634315, 2.0009656854))
            Line((19.7994634315, 2.0009656854), (19.9996, 2.0009656854))
        make_face()
    extrude(amount=-F5_T64_DEPTH)

    split(bisect_by=Plane.YZ.offset(50), keep=Keep.TOP)


with BuildPart() as f5_tool58_1:
    add(f5_tool58.part)

    # F5_t66: intersect F5_tool62
    add(f5_tool62.part, mode=Mode.INTERSECT)


with BuildPart() as f1_5:
    add(f1_4.part)

    # F5_t56: cut F5_tool58
    add(f5_tool58_1.part, mode=Mode.SUBTRACT)


solid = f1_5.part
